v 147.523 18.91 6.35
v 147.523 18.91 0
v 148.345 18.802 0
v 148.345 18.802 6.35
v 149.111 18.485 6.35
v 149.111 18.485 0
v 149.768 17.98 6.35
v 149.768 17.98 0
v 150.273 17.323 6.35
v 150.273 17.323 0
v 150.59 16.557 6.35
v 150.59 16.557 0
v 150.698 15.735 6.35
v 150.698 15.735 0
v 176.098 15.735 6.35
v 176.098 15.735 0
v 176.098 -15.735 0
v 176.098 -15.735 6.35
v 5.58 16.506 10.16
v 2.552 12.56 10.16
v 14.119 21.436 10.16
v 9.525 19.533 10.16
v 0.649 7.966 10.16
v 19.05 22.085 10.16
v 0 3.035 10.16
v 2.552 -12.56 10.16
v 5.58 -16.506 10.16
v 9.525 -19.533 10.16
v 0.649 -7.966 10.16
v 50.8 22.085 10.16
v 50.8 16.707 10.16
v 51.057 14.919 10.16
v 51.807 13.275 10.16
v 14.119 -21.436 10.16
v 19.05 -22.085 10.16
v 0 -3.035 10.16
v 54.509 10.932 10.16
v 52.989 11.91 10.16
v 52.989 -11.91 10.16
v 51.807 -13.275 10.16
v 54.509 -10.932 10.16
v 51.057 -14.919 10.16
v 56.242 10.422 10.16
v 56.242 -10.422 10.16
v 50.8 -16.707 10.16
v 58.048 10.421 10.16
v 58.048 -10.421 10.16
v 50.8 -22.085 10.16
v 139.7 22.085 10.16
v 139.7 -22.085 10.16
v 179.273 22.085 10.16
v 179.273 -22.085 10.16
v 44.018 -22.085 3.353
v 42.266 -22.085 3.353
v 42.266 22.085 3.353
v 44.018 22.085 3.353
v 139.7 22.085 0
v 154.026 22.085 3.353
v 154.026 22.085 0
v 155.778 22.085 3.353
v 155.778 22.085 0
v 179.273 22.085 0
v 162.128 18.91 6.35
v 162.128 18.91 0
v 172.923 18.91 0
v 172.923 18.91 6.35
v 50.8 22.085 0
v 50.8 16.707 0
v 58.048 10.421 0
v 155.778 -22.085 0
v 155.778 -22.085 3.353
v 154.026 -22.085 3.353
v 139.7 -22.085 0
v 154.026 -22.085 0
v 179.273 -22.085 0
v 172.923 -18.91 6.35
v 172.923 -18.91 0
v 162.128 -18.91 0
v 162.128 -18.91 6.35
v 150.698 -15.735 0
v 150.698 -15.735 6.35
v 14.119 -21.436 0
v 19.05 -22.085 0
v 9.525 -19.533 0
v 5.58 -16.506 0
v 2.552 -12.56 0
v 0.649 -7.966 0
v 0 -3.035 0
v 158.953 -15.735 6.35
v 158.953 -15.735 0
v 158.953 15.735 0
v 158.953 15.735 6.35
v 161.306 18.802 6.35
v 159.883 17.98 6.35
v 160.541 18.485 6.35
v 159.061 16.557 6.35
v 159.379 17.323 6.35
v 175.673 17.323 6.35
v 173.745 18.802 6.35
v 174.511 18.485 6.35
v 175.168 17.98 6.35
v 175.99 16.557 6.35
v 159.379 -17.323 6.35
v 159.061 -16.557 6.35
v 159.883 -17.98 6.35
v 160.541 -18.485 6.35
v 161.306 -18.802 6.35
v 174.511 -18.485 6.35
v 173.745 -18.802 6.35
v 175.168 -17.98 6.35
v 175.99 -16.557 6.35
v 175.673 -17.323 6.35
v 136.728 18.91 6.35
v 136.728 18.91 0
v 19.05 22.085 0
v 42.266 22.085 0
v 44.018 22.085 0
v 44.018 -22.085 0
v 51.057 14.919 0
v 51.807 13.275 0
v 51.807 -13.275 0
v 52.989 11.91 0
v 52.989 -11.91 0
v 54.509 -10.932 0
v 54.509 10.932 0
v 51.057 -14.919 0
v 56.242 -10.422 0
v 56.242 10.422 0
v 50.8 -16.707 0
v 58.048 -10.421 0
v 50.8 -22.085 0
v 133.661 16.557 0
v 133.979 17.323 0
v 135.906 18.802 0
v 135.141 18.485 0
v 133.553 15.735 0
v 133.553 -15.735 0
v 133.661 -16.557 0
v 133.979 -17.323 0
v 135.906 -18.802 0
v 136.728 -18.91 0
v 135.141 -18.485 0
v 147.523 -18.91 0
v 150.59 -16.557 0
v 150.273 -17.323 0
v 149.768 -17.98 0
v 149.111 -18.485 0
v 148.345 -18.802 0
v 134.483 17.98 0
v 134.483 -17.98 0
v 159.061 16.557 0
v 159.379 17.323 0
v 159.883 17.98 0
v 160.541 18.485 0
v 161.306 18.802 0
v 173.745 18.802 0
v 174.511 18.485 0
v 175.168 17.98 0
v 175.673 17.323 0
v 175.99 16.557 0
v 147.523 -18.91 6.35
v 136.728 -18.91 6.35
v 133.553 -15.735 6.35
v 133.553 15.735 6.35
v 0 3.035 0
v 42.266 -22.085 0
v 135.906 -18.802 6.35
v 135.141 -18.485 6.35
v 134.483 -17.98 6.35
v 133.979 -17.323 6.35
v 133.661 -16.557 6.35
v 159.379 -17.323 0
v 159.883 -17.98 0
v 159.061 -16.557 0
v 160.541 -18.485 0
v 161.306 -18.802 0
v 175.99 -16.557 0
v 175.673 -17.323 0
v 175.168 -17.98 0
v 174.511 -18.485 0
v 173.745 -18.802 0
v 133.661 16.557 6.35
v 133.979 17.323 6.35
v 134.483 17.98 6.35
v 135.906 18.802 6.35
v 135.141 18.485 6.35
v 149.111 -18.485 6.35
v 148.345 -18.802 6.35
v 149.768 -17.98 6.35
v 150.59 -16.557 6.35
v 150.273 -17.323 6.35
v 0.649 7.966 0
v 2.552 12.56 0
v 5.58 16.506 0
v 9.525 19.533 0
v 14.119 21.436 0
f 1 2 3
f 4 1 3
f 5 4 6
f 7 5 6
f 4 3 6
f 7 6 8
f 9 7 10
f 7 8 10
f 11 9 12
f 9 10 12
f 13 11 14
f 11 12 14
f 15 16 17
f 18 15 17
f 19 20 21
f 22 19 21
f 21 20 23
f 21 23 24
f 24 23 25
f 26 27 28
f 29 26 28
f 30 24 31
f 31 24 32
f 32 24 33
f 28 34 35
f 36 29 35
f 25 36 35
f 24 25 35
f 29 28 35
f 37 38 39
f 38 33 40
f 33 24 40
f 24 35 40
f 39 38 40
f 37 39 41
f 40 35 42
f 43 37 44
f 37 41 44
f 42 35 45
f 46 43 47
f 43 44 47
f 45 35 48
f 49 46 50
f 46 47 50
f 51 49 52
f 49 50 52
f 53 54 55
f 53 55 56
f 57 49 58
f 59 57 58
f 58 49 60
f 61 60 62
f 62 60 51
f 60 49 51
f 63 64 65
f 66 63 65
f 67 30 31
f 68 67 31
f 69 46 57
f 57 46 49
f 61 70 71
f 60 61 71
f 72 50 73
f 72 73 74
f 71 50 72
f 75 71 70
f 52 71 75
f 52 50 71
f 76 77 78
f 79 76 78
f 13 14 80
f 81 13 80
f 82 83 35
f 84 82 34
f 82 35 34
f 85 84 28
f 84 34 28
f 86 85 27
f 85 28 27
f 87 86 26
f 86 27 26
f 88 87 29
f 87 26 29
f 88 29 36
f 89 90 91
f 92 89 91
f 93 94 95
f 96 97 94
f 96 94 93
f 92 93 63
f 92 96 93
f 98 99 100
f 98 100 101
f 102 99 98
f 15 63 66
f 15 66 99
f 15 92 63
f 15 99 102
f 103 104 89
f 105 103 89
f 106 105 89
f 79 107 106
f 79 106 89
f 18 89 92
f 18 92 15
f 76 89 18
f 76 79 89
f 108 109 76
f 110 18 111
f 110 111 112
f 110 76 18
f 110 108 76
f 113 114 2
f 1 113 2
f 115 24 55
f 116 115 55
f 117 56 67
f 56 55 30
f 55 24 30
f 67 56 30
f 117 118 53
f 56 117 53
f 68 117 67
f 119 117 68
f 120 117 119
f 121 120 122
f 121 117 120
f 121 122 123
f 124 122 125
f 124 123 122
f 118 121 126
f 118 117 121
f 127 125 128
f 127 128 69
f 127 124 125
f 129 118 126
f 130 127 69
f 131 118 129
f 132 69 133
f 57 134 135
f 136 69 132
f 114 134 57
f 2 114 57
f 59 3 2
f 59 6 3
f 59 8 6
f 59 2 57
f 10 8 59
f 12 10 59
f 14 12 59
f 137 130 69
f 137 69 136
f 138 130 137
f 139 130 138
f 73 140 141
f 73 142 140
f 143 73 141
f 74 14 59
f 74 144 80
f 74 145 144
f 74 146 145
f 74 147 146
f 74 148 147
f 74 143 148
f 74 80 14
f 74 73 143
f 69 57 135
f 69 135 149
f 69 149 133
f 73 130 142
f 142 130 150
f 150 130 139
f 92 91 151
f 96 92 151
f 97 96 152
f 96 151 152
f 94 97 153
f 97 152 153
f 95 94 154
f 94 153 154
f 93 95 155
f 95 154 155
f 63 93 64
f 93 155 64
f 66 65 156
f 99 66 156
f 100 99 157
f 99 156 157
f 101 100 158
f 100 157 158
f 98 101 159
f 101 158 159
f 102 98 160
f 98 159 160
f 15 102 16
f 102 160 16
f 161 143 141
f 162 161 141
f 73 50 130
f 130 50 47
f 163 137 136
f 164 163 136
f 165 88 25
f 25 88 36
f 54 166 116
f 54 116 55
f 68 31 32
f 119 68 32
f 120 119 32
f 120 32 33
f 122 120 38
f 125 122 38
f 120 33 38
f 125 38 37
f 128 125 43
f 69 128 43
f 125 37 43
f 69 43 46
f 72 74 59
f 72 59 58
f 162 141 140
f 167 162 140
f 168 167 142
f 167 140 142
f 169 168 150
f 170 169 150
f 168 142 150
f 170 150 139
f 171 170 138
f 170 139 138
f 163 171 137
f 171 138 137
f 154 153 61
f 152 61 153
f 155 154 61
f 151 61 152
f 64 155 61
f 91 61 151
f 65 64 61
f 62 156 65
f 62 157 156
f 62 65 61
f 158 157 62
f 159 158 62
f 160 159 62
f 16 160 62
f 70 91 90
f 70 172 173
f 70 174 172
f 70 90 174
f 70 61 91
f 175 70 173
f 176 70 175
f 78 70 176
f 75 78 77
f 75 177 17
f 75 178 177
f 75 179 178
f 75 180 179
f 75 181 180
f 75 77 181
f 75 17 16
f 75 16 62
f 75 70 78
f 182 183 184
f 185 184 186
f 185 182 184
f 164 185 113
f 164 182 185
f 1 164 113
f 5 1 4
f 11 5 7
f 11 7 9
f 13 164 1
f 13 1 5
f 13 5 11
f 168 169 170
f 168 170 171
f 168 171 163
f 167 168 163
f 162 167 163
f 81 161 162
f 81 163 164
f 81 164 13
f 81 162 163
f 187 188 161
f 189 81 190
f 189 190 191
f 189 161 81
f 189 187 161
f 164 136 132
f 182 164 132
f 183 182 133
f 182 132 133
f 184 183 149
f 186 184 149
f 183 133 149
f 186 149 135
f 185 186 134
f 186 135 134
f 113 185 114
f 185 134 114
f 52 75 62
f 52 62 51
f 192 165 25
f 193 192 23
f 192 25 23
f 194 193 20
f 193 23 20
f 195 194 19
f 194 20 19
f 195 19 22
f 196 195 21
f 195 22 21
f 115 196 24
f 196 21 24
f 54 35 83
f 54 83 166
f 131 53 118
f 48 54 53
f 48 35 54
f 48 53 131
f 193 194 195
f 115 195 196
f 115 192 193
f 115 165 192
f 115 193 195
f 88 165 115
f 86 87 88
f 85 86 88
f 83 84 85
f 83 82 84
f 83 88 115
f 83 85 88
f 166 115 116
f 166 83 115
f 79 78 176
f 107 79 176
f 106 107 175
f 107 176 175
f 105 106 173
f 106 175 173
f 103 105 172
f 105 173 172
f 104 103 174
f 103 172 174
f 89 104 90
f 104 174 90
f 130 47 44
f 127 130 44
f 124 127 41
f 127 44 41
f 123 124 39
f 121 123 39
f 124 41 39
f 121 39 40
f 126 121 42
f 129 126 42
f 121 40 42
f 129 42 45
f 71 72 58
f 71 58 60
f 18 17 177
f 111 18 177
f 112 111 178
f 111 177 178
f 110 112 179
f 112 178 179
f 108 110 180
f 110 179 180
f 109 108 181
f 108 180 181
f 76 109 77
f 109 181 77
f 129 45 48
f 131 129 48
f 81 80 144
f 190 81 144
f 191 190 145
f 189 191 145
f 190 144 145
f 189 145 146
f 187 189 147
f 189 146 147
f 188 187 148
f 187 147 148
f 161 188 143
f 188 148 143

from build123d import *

# Parameters (mm, degrees)
F0_W      = 179.2732
F0_H      = 31.5976
F1_DEPTH  = 22.0853
F2_W      = 1.7526
F2_H      = 3.3528
F3_DEPTH  = 44.1716
F4_W      = 179.2732
F4_H      = 21.4376
F5_DEPTH  = 44.1716
F7_DEPTH  = 10.161
F9_DEPTH  = 6.35
F11_DEPTH = 10.161


with BuildPart() as f1:
    # F0 (on Front) → F1 (new body, symmetric)
    with BuildSketch(Plane.XZ):
        with Locations((89.6366, 15.7988)):
            Rectangle(F0_W, F0_H)
    extrude(amount=F1_DEPTH, both=True)

    # F2 (on face) → F3 (cut, through all)
    with BuildSketch(Plane.XZ.offset(22.0853)):
        with Locations((43.1419, 1.6764)):
            Rectangle(F2_W, F2_H)
        with Locations((154.9019, 1.6764)):
            Rectangle(F2_W, F2_H)
    extrude(amount=-F3_DEPTH, mode=Mode.SUBTRACT)

    # F4 (on face) → F5 (cut, through all)
    with BuildSketch(Plane.XZ.offset(22.0853)):
        with Locations((89.6366, 20.8788)):
            Rectangle(F4_W, F4_H)
    extrude(amount=-F5_DEPTH, mode=Mode.SUBTRACT)

    # F6 (on face) → F7 (cut, through all)
    with BuildSketch(Plane.XY.offset(10.16)):
        with BuildLine():
            Line((58.048026, 10.420732), (139.7, 22.0853))
            Line((139.7, 22.0853), (50.8, 22.0853))
            Line((50.8, 22.0853), (50.8, 16.706912))
            ThreePointArc((50.8, 16.706912), (52.989469, 11.909779), (58.048026, 10.420732))
        make_face()
        with BuildLine():
            Line((139.7, -22.0853), (58.048026, -10.420732))
            ThreePointArc((58.048026, -10.420732), (52.989469, -11.909779), (50.8, -16.706912))
            Line((50.8, -16.706912), (50.8, -22.0853))
            Line((50.8, -22.0853), (139.7, -22.0853))
        make_face()
    extrude(amount=-F7_DEPTH, mode=Mode.SUBTRACT)

    # F8 (on face) → F9 (cut)
    with BuildSketch(Plane(origin=(0, 0, 0), x_dir=(1, 0, 0), z_dir=(0, 0, -1))):
        with BuildLine():
            Line((172.9232, 18.9103), (162.1282, 18.9103))
            ThreePointArc((162.1282, 18.9103), (159.883136, 17.980364), (158.9532, 15.7353))
            Line((158.9532, 15.7353), (158.9532, -15.7353))
            ThreePointArc((158.9532, -15.7353), (159.883136, -17.980364), (162.1282, -18.9103))
            Line((162.1282, -18.9103), (172.9232, -18.9103))
            ThreePointArc((172.9232, -18.9103), (175.168264, -17.980364), (176.0982, -15.7353))
            Line((176.0982, -15.7353), (176.0982, 15.7353))
            ThreePointArc((176.0982, 15.7353), (175.168264, 17.980364), (172.9232, 18.9103))
        make_face()
        with BuildLine():
            Line((147.5232, 18.9103), (136.7282, 18.9103))
            ThreePointArc((136.7282, 18.9103), (134.483136, 17.980364), (133.5532, 15.7353))
            Line((133.5532, 15.7353), (133.5532, -15.7353))
            ThreePointArc((133.5532, -15.7353), (134.483136, -17.980364), (136.7282, -18.9103))
            Line((136.7282, -18.9103), (147.5232, -18.9103))
            ThreePointArc((147.5232, -18.9103), (149.768264, -17.980364), (150.6982, -15.7353))
            Line((150.6982, -15.7353), (150.6982, 15.7353))
            ThreePointArc((150.6982, 15.7353), (149.768264, 17.980364), (147.5232, 18.9103))
        make_face()
    extrude(amount=-F9_DEPTH, mode=Mode.SUBTRACT)

    # F10 (on face) → F11 (cut, through all)
    with BuildSketch(Plane.XY.offset(10.16)):
        with BuildLine():
            ThreePointArc((0, 3.0353), (5.579616, 16.505684), (19.05, 22.0853))
            Line((19.05, 22.0853), (0, 22.0853))
            Line((0, 22.0853), (0, 3.0353))
        make_face()
        with BuildLine():
            ThreePointArc((19.05, -22.0853), (5.579616, -16.505684), (0, -3.0353))
            Line((0, -3.0353), (0, -22.0853))
            Line((0, -22.0853), (19.05, -22.0853))
        make_face()
    extrude(amount=-F11_DEPTH, mode=Mode.SUBTRACT)


solid = f1.part
